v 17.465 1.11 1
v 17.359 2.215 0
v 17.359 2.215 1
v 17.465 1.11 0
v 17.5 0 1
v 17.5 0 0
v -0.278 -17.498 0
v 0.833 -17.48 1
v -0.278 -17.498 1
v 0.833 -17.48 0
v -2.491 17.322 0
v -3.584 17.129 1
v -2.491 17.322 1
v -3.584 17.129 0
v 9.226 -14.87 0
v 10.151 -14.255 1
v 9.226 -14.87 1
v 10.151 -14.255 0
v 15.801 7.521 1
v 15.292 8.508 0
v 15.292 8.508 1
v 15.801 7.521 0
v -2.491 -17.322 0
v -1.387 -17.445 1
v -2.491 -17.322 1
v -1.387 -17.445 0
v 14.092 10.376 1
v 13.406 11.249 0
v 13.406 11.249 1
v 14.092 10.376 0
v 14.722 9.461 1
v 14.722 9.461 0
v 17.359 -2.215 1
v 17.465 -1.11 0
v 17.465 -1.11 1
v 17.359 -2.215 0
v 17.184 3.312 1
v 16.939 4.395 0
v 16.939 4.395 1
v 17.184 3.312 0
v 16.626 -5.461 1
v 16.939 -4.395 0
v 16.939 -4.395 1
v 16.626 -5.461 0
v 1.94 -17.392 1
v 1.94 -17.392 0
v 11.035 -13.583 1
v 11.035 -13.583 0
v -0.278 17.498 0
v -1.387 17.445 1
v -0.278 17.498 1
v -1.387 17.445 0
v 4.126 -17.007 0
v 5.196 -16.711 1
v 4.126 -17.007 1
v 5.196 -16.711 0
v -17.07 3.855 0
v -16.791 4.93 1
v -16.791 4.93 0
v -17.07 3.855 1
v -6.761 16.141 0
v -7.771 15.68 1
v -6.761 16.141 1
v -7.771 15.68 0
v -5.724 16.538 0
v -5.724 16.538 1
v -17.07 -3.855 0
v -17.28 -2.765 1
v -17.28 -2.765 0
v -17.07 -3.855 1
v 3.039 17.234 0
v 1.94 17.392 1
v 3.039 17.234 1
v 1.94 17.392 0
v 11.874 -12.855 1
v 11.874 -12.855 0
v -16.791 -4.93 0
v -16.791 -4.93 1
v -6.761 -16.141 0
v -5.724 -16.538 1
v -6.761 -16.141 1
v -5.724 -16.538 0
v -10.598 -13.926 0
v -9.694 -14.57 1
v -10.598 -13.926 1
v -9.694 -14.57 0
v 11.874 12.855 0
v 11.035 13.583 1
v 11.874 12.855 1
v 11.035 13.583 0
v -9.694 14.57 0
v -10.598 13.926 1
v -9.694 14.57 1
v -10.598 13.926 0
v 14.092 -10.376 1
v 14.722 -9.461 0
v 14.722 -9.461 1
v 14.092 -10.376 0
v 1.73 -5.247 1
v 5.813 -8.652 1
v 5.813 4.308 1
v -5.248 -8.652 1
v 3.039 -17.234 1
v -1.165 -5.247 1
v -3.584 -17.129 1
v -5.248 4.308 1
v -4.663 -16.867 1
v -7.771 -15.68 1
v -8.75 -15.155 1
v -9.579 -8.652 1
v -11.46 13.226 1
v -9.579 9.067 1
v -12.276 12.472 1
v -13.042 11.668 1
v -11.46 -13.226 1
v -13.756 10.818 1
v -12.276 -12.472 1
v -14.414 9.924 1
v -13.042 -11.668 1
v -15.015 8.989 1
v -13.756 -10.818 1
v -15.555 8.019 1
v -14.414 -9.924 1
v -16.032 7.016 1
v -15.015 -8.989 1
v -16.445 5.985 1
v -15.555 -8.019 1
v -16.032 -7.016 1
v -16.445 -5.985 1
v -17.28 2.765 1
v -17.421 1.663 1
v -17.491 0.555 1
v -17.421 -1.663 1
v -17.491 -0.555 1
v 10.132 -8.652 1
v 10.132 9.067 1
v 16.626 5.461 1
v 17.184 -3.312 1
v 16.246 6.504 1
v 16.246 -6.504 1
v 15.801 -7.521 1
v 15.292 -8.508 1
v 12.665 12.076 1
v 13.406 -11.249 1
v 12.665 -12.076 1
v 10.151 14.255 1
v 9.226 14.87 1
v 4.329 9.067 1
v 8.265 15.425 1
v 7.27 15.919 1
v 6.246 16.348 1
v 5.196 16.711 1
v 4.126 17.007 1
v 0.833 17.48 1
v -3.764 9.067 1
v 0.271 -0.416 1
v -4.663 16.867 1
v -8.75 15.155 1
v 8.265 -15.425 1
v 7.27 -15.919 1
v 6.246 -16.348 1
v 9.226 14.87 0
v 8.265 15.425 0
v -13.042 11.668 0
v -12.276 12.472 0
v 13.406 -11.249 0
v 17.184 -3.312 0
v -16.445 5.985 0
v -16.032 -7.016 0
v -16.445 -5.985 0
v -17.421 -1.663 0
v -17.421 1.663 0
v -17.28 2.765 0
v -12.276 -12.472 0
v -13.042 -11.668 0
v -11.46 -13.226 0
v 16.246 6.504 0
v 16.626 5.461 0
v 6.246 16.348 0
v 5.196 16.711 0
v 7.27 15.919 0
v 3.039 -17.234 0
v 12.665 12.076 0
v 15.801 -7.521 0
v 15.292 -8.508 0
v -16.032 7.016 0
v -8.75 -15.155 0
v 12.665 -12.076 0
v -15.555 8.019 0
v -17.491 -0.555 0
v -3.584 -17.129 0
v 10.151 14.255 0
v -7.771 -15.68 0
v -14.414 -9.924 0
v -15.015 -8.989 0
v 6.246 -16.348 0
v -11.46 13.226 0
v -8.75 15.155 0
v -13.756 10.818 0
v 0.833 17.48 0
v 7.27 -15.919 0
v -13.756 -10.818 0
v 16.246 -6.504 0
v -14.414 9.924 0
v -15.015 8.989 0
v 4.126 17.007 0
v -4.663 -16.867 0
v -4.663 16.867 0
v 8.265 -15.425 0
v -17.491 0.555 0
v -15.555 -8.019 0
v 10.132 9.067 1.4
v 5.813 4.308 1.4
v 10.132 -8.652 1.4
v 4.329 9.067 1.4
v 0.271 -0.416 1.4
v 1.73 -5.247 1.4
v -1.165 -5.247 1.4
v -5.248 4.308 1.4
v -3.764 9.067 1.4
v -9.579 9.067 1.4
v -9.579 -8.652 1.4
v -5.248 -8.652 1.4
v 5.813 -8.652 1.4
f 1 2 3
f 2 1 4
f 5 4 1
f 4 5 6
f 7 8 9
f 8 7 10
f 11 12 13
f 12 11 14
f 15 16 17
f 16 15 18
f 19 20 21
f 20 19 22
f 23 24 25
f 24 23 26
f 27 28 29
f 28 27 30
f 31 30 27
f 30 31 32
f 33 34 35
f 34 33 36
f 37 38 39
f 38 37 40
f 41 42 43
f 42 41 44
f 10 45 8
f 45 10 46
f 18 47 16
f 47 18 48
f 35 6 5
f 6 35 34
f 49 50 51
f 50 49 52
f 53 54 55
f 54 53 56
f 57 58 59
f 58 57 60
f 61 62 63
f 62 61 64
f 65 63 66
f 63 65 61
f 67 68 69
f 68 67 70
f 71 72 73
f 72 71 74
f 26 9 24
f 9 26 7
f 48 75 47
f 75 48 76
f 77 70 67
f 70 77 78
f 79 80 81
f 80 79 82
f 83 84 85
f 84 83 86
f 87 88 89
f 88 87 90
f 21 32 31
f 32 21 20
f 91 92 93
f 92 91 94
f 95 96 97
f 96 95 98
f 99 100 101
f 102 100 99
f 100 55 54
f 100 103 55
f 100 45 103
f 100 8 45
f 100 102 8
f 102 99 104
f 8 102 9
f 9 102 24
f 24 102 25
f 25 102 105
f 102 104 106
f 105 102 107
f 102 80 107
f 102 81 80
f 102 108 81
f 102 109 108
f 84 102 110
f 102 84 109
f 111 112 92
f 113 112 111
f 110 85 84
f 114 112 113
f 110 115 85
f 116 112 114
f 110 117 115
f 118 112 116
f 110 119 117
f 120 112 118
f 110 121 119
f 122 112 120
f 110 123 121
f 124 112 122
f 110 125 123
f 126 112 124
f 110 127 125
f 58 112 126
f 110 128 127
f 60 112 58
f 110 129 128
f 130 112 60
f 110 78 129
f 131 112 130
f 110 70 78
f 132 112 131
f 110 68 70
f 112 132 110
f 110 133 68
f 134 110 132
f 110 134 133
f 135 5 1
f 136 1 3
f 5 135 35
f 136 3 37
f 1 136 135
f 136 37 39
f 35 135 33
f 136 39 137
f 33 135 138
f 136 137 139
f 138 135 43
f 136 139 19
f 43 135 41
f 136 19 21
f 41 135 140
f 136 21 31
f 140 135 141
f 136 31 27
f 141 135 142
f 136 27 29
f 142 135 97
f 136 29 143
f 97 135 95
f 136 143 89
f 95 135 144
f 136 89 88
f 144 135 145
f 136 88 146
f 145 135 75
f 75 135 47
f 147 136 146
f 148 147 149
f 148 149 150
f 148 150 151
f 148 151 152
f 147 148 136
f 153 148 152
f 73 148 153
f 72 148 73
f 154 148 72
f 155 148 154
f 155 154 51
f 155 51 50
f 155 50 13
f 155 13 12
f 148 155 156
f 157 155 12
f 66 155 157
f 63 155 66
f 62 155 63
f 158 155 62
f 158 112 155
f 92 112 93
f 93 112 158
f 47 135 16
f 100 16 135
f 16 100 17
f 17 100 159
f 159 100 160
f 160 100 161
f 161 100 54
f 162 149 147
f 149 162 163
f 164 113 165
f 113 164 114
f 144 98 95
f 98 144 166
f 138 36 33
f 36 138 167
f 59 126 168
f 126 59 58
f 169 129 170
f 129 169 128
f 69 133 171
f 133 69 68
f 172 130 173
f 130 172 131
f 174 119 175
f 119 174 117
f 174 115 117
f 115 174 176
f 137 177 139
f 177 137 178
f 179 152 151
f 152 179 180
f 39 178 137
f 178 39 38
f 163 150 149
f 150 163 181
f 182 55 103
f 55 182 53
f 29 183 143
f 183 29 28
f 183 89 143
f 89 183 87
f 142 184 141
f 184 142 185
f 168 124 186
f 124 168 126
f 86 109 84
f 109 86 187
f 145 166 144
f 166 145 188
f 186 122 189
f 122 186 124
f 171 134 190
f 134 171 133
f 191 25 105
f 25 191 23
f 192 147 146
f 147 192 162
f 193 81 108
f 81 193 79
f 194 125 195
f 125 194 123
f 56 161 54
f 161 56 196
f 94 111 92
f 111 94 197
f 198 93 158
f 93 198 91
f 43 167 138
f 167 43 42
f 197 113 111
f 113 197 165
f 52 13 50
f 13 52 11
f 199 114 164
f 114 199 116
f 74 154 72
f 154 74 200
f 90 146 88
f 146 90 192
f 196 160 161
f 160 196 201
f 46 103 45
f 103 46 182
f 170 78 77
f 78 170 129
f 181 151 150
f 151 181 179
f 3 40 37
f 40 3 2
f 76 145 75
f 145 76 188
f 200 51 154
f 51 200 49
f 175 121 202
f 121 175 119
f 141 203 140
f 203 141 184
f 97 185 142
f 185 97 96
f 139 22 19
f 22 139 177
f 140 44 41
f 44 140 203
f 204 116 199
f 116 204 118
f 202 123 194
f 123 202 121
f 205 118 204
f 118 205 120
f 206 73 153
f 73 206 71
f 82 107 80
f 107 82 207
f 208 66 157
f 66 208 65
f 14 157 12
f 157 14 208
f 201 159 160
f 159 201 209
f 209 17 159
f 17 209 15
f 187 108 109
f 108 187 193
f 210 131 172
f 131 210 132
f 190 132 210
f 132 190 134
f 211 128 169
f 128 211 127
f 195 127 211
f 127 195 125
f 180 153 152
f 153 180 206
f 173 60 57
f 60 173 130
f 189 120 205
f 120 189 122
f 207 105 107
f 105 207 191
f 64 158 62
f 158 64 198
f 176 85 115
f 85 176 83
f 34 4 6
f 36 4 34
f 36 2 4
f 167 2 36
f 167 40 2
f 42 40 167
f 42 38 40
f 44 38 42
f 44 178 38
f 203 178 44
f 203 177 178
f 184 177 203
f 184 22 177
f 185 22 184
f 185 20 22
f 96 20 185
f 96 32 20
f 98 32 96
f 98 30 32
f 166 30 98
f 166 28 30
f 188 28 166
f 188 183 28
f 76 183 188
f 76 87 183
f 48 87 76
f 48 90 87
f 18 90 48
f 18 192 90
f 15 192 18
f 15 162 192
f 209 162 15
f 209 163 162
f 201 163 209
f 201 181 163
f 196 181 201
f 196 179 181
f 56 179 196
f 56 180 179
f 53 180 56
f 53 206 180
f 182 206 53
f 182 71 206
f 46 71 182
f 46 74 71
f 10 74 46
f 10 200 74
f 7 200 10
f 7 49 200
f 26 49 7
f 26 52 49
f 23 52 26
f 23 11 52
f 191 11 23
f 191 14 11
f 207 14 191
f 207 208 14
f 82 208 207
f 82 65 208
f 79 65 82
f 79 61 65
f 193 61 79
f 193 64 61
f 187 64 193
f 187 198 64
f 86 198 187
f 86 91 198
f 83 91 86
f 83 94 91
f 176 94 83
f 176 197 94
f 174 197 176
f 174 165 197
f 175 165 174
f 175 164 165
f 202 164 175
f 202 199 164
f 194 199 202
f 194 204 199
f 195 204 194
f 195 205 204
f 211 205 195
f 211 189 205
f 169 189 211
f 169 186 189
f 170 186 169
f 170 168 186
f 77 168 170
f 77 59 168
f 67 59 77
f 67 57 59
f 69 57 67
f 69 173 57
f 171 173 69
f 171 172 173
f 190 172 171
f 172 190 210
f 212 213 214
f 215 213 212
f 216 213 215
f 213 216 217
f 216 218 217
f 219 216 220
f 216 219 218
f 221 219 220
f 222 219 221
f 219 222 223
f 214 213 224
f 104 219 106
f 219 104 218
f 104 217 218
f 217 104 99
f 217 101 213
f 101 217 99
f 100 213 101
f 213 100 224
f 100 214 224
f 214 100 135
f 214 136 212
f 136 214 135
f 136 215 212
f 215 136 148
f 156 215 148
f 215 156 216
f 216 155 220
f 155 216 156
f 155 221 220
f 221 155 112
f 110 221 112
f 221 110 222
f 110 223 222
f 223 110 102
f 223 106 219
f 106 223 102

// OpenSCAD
/* [Config] */

//Letter to engrave or extrude
letter = "M";
// Diameter of the circle
diameter = 35; //[10:50]
//height of the cirle
height=1; //[0.5:0.5:10]
//You want to engrave or extrude?
raised_or_engraved = 1; //[1:Raised, 0:Engraved]
// Depth or hieght of the engraving
depth_or_height = 0.4;

/* [Expert] */


//Scale modifier. Change this to adjust the scale modifier. Might be needed with a different font. Larger is smaller letter
scale_modifier = 20;
//Font
font = "Calibri:style=Bold";

/* [Hidden] */
$fn=99;
_letter = str(letter);

module CircleLetter() {
    if (raised_or_engraved==1) {
        union() {
            cylinder(d=diameter, h=height);
            linear_extrude(height+depth_or_height) scale(diameter/scale_modifier, diameter/scale_modifier, 1) text(_letter, valign="center", halign="center", font=font);
        }
    } else {
        difference() {
            cylinder(d=diameter, h=height);
            translate([0, 0, height-depth_or_height]) linear_extrude(depth_or_height+0.1) scale(diameter/scale_modifier, diameter/scale_modifier, 1) text(_letter, valign="center", halign="center", font=font);
        }
    }
}

CircleLetter();
